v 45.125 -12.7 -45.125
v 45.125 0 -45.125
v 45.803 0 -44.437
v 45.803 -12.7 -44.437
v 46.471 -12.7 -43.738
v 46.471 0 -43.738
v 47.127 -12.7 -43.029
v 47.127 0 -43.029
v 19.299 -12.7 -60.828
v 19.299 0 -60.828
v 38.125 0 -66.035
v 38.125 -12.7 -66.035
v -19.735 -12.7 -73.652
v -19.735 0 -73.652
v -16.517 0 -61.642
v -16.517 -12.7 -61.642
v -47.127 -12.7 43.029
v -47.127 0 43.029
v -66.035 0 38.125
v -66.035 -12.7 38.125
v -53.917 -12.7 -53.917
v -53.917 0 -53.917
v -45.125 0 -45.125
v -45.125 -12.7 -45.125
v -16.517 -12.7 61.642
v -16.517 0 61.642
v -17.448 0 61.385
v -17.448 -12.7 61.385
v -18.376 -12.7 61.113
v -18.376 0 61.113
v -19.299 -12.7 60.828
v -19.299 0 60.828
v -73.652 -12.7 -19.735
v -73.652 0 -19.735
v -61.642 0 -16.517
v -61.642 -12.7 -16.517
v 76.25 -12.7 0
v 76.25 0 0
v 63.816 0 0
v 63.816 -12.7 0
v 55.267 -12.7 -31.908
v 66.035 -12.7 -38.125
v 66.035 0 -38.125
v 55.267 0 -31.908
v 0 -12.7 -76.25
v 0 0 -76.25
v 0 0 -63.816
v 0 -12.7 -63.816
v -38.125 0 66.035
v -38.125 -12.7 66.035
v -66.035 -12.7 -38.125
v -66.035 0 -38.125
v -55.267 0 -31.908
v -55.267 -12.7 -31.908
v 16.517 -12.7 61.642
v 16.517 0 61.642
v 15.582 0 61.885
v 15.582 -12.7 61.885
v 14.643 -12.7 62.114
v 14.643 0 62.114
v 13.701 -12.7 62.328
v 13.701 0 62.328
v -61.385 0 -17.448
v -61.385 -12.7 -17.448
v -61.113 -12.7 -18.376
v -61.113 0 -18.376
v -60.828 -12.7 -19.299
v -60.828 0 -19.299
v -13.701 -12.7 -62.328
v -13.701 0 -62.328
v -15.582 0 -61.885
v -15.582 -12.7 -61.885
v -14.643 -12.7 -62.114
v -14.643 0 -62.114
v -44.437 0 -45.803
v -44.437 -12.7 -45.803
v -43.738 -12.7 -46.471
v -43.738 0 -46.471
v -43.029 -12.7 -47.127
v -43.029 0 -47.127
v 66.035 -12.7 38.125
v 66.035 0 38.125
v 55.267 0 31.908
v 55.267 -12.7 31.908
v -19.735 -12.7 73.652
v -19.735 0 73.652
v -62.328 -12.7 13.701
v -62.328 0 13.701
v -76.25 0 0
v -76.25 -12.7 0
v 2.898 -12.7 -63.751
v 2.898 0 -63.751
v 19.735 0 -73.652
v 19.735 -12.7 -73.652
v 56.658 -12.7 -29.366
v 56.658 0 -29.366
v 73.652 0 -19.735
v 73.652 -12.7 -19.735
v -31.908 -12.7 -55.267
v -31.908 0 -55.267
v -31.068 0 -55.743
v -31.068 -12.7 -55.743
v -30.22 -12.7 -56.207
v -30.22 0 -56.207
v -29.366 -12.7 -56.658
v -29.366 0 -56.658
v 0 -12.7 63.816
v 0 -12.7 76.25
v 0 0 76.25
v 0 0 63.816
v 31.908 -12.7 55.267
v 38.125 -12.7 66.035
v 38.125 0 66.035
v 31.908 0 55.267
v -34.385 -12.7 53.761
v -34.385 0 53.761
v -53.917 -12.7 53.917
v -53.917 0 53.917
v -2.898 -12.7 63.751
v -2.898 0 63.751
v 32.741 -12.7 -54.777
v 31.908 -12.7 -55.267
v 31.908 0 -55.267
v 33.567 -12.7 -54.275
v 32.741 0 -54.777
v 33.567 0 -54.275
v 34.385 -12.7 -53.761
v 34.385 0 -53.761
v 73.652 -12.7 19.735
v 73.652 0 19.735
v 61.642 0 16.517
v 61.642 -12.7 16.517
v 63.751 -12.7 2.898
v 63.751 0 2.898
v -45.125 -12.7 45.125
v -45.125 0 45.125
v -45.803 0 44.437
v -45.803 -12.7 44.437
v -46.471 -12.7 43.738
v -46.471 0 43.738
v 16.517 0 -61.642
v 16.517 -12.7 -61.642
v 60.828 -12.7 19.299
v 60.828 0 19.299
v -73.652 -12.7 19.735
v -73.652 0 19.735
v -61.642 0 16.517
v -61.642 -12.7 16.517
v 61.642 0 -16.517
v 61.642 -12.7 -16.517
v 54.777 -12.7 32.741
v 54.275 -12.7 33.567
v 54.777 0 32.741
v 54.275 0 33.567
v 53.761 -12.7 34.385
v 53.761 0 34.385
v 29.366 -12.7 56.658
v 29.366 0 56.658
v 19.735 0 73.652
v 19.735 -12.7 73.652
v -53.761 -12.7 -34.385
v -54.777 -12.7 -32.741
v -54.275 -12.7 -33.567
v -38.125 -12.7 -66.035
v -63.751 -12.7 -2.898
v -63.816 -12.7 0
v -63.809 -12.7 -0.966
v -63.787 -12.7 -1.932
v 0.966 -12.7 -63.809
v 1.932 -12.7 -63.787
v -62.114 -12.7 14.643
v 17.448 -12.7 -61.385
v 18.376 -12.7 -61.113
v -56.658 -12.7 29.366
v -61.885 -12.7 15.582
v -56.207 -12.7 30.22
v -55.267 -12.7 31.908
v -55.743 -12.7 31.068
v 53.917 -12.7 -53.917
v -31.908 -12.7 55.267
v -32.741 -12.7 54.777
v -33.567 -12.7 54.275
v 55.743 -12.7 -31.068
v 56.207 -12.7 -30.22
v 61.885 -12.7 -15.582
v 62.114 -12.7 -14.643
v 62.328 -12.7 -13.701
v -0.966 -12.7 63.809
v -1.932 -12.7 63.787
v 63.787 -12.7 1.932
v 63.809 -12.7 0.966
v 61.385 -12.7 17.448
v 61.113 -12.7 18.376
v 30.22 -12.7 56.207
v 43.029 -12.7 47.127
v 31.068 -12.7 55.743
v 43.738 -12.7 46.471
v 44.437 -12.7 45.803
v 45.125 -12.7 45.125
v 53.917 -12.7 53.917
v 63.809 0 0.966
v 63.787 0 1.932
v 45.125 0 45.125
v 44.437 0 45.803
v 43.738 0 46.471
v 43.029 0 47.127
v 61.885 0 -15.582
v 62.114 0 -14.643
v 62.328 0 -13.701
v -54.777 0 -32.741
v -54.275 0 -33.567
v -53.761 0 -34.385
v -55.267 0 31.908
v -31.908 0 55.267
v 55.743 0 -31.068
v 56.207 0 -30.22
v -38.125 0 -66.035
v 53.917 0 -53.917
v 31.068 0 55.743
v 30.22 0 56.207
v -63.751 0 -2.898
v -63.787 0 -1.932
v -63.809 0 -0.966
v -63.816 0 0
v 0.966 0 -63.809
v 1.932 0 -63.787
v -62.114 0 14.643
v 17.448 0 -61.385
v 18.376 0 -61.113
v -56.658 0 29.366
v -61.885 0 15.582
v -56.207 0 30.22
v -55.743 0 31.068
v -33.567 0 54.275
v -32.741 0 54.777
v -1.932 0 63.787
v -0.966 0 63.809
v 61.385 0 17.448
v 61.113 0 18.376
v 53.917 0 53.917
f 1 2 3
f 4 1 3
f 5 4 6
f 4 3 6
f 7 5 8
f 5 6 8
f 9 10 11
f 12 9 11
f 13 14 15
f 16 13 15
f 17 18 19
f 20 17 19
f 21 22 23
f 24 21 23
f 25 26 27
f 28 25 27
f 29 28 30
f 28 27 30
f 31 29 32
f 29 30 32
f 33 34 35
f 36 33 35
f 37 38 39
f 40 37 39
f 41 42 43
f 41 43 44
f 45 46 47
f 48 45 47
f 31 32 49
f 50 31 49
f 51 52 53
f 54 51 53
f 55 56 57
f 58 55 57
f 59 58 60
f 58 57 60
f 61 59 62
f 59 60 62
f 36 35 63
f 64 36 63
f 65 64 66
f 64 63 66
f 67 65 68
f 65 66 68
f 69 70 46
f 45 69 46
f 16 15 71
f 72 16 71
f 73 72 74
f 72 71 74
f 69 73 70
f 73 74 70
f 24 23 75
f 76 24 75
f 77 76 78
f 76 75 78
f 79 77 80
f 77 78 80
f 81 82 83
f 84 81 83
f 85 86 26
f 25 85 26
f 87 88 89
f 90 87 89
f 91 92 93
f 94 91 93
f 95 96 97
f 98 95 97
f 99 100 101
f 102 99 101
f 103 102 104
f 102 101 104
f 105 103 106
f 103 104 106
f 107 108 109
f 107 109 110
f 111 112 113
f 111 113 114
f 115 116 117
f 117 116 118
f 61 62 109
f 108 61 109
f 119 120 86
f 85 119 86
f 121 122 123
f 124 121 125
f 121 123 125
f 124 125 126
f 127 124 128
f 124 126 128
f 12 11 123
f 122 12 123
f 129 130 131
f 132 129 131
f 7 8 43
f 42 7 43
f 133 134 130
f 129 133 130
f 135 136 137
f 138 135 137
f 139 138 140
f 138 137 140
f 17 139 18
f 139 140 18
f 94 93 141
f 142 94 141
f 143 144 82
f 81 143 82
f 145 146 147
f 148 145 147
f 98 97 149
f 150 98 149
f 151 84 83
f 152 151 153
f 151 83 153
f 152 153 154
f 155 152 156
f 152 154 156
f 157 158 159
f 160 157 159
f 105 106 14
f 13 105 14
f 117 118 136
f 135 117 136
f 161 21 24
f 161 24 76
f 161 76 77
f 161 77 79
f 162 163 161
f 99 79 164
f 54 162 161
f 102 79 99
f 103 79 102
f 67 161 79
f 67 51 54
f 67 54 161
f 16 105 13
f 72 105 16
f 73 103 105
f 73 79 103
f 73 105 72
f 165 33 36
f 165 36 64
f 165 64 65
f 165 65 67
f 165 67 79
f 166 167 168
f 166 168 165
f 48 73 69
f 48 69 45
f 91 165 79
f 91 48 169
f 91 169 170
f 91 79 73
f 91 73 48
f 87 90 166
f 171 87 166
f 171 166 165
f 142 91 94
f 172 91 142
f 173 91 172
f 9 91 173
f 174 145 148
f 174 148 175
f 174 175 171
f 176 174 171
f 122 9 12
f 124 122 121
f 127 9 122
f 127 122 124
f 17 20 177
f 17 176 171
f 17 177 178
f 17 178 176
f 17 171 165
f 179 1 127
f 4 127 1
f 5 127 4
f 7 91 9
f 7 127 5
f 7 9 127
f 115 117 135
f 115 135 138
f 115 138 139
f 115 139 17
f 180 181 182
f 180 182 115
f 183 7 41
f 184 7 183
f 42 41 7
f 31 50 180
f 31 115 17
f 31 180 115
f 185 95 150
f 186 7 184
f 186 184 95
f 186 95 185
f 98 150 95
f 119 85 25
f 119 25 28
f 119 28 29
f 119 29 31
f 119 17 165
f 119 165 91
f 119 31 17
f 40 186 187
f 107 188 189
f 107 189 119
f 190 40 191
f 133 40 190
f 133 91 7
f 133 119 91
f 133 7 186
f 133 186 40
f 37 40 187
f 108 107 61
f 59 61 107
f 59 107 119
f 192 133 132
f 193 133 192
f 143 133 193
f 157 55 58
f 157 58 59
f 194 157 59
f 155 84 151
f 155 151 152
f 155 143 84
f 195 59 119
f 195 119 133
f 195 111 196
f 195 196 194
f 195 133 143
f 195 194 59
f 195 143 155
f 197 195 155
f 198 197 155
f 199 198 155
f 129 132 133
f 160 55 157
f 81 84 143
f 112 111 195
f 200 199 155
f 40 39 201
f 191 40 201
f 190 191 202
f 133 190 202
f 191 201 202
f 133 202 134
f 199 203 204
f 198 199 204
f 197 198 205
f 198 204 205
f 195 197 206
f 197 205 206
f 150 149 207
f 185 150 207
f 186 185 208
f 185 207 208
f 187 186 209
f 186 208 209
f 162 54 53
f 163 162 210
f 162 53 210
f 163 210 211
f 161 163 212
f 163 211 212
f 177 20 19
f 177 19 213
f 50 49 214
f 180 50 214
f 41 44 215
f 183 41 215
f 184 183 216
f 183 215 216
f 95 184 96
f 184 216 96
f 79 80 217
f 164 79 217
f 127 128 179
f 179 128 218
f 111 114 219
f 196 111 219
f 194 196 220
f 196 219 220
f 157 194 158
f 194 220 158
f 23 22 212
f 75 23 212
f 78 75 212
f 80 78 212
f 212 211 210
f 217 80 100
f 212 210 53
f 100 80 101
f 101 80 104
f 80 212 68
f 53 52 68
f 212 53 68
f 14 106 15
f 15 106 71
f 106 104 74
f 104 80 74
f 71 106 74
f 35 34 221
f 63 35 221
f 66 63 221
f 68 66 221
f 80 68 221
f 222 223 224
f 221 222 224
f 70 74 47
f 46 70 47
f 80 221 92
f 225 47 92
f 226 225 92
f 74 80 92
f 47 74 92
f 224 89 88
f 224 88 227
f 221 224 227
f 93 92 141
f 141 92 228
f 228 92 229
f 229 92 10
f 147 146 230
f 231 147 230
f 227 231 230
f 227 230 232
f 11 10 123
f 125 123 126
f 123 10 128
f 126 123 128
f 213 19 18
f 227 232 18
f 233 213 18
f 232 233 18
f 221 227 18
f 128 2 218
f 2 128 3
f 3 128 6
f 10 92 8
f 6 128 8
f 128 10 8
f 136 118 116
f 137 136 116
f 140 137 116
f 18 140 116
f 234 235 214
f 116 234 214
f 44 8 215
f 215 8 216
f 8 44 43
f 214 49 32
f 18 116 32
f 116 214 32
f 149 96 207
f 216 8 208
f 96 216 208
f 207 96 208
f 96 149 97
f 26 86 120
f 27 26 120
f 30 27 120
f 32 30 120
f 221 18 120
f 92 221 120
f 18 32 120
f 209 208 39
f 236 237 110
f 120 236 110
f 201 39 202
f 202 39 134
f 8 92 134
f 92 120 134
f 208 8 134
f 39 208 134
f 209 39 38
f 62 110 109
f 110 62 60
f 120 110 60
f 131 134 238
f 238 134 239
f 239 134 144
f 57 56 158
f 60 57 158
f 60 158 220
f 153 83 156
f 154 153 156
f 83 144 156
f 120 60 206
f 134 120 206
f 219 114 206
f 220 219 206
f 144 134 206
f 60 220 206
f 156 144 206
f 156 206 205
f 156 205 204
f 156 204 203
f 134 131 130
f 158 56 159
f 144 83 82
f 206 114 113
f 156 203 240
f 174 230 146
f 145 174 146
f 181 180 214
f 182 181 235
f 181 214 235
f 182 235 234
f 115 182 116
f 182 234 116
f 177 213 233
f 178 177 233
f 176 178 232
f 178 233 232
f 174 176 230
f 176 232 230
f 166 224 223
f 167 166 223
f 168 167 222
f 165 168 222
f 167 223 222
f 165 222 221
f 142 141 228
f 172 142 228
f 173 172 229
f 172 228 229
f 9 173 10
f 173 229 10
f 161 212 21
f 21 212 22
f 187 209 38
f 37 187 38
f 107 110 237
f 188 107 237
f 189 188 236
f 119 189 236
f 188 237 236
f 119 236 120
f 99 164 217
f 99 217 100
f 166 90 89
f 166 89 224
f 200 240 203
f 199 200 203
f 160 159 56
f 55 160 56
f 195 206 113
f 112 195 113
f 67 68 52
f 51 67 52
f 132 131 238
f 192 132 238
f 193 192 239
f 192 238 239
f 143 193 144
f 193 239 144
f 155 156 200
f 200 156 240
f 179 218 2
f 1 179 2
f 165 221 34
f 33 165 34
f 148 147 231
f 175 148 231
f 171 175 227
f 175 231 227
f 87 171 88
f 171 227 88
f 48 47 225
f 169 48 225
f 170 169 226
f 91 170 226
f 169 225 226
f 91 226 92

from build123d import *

# Parameters (mm, degrees)
F1_DEPTH = 12.7


with BuildPart() as f1:
    # F0 (on Front) → F1 (new body)
    with BuildSketch(Plane.XZ):
        with BuildLine():
            ThreePointArc((13.700902, 62.328232), (6.890739, 63.44321), (0, 63.816324))
            ThreePointArc((0, 63.816324), (-1.449213, 63.799867), (-2.897679, 63.750503))
            ThreePointArc((-2.897679, 63.750503), (-9.764368, 63.06489), (-16.51688, 61.641836))
            ThreePointArc((-16.51688, 61.641836), (-17.912453, 61.250855), (-19.298787, 60.828283))
            ThreePointArc((-19.298787, 60.828283), (-25.75405, 58.388801), (-31.908162, 55.266558))
            ThreePointArc((-31.908162, 55.266558), (-33.154989, 54.527699), (-34.384715, 53.760716))
            ThreePointArc((-34.384715, 53.760716), (-39.988636, 49.733612), (-45.124956, 45.124956))
            ThreePointArc((-45.124956, 45.124956), (-46.138067, 44.08857), (-47.127381, 43.029445))
            ThreePointArc((-47.127381, 43.029445), (-51.498062, 37.68916), (-55.266558, 31.908162))
            ThreePointArc((-55.266558, 31.908162), (-55.976912, 30.644878), (-56.658395, 29.365788))
            ThreePointArc((-56.658395, 29.365788), (-59.497981, 23.076254), (-61.641836, 16.51688))
            ThreePointArc((-61.641836, 16.51688), (-62.001023, 15.112788), (-62.328232, 13.700902))
            ThreePointArc((-62.328232, 13.700902), (-63.44321, 6.890739), (-63.816324, 0))
            ThreePointArc((-63.816324, 0), (-63.799867, -1.449213), (-63.750503, -2.897679))
            ThreePointArc((-63.750503, -2.897679), (-63.06489, -9.764368), (-61.641836, -16.51688))
            ThreePointArc((-61.641836, -16.51688), (-61.250855, -17.912453), (-60.828283, -19.298787))
            ThreePointArc((-60.828283, -19.298787), (-58.388801, -25.75405), (-55.266558, -31.908162))
            ThreePointArc((-55.266558, -31.908162), (-54.527699, -33.154989), (-53.760716, -34.384715))
            ThreePointArc((-53.760716, -34.384715), (-49.733612, -39.988636), (-45.124956, -45.124956))
            ThreePointArc((-45.124956, -45.124956), (-44.08857, -46.138067), (-43.029445, -47.127381))
            ThreePointArc((-43.029445, -47.127381), (-37.68916, -51.498062), (-31.908162, -55.266558))
            ThreePointArc((-31.908162, -55.266558), (-30.644878, -55.976912), (-29.365788, -56.658395))
            ThreePointArc((-29.365788, -56.658395), (-23.076254, -59.497981), (-16.51688, -61.641836))
            ThreePointArc((-16.51688, -61.641836), (-15.112788, -62.001023), (-13.700902, -62.328232))
            ThreePointArc((-13.700902, -62.328232), (-6.890739, -63.44321), (0, -63.816324))
            ThreePointArc((0, -63.816324), (1.449213, -63.799867), (2.897679, -63.750503))
            ThreePointArc((2.897679, -63.750503), (9.764368, -63.06489), (16.51688, -61.641836))
            ThreePointArc((16.51688, -61.641836), (17.912453, -61.250855), (19.298787, -60.828283))
            ThreePointArc((19.298787, -60.828283), (25.75405, -58.388801), (31.908162, -55.266558))
            ThreePointArc((31.908162, -55.266558), (33.154989, -54.527699), (34.384715, -53.760716))
            ThreePointArc((34.384715, -53.760716), (39.988636, -49.733612), (45.124956, -45.124956))
            ThreePointArc((45.124956, -45.124956), (46.138067, -44.08857), (47.127381, -43.029445))
            ThreePointArc((47.127381, -43.029445), (51.498062, -37.68916), (55.266558, -31.908162))
            ThreePointArc((55.266558, -31.908162), (55.976912, -30.644878), (56.658395, -29.365788))
            ThreePointArc((56.658395, -29.365788), (59.497981, -23.076254), (61.641836, -16.51688))
            ThreePointArc((61.641836, -16.51688), (62.001023, -15.112788), (62.328232, -13.700902))
            ThreePointArc((62.328232, -13.700902), (63.44321, -6.890739), (63.816324, 0))
            ThreePointArc((63.816324, 0), (63.799867, 1.449213), (63.750503, 2.897679))
            ThreePointArc((63.750503, 2.897679), (63.06489, 9.764368), (61.641836, 16.51688))
            ThreePointArc((61.641836, 16.51688), (61.250855, 17.912453), (60.828283, 19.298787))
            ThreePointArc((60.828283, 19.298787), (58.388801, 25.75405), (55.266558, 31.908162))
            ThreePointArc((55.266558, 31.908162), (54.527699, 33.154989), (53.760716, 34.384715))
            ThreePointArc((53.760716, 34.384715), (49.733612, 39.988636), (45.124956, 45.124956))
            ThreePointArc((45.124956, 45.124956), (44.08857, 46.138067), (43.029445, 47.127381))
            ThreePointArc((43.029445, 47.127381), (37.68916, 51.498062), (31.908162, 55.266558))
            ThreePointArc((31.908162, 55.266558), (30.644878, 55.976912), (29.365788, 56.658395))
            ThreePointArc((29.365788, 56.658395), (23.076254, 59.497981), (16.51688, 61.641836))
            ThreePointArc((16.51688, 61.641836), (15.112788, 62.001023), (13.700902, 62.328232))
        make_face()
        with BuildLine():
            ThreePointArc((-45.124956, 45.124956), (-39.988636, 49.733612), (-34.384715, 53.760716))
            Line((-34.384715, 53.760716), (-53.916988, 53.916988))
            Line((-53.916988, 53.916988), (-45.124956, 45.124956))
        make_face()
        with BuildLine():
            ThreePointArc((-31.908162, 55.266558), (-25.75405, 58.388801), (-19.298787, 60.828283))
            Line((-19.298787, 60.828283), (-38.125068, 66.034555))
            Line((-38.125068, 66.034555), (-31.908162, 55.266558))
        make_face()
        with BuildLine():
            ThreePointArc((-16.51688, 61.641836), (-9.764368, 63.06489), (-2.897679, 63.750503))
            Line((-2.897679, 63.750503), (-19.734987, 73.651976))
            Line((-19.734987, 73.651976), (-16.51688, 61.641836))
        make_face()
        with BuildLine():
            Line((0, 76.250136), (0, 63.816324))
            ThreePointArc((0, 63.816324), (6.890739, 63.44321), (13.700902, 62.328232))
            Line((13.700902, 62.328232), (0, 76.250136))
        make_face()
        with BuildLine():
            Line((19.734987, 73.651976), (16.51688, 61.641836))
            ThreePointArc((16.51688, 61.641836), (23.076254, 59.497981), (29.365788, 56.658395))
            Line((29.365788, 56.658395), (19.734987, 73.651976))
        make_face()
        with BuildLine():
            Line((38.125068, 66.034555), (31.908162, 55.266558))
            ThreePointArc((31.908162, 55.266558), (37.68916, 51.498062), (43.029445, 47.127381))
            Line((43.029445, 47.127381), (38.125068, 66.034555))
        make_face()
        with BuildLine():
            Line((53.916988, 53.916988), (45.124956, 45.124956))
            ThreePointArc((45.124956, 45.124956), (49.733612, 39.988636), (53.760716, 34.384715))
            Line((53.760716, 34.384715), (53.916988, 53.916988))
        make_face()
        with BuildLine():
            Line((66.034555, 38.125068), (55.266558, 31.908162))
            ThreePointArc((55.266558, 31.908162), (58.388801, 25.75405), (60.828283, 19.298787))
            Line((60.828283, 19.298787), (66.034555, 38.125068))
        make_face()
        with BuildLine():
            Line((73.651976, 19.734987), (61.641836, 16.51688))
            ThreePointArc((61.641836, 16.51688), (63.06489, 9.764368), (63.750503, 2.897679))
            Line((63.750503, 2.897679), (73.651976, 19.734987))
        make_face()
        with BuildLine():
            Line((76.250136, 0), (63.816324, 0))
            ThreePointArc((63.816324, 0), (63.44321, -6.890739), (62.328232, -13.700902))
            Line((62.328232, -13.700902), (76.250136, 0))
        make_face()
        with BuildLine():
            Line((73.651976, -19.734987), (61.641836, -16.51688))
            ThreePointArc((61.641836, -16.51688), (59.497981, -23.076254), (56.658395, -29.365788))
            Line((56.658395, -29.365788), (73.651976, -19.734987))
        make_face()
        with BuildLine():
            Line((66.034555, -38.125068), (55.266558, -31.908162))
            ThreePointArc((55.266558, -31.908162), (51.498062, -37.68916), (47.127381, -43.029445))
            Line((47.127381, -43.029445), (66.034555, -38.125068))
        make_face()
        with BuildLine():
            Line((53.916988, -53.916988), (45.124956, -45.124956))
            ThreePointArc((45.124956, -45.124956), (39.988636, -49.733612), (34.384715, -53.760716))
            Line((34.384715, -53.760716), (53.916988, -53.916988))
        make_face()
        with BuildLine():
            Line((38.125068, -66.034555), (31.908162, -55.266558))
            ThreePointArc((31.908162, -55.266558), (25.75405, -58.388801), (19.298787, -60.828283))
            Line((19.298787, -60.828283), (38.125068, -66.034555))
        make_face()
        with BuildLine():
            Line((19.734987, -73.651976), (16.51688, -61.641836))
            ThreePointArc((16.51688, -61.641836), (9.764368, -63.06489), (2.897679, -63.750503))
            Line((2.897679, -63.750503), (19.734987, -73.651976))
        make_face()
        with BuildLine():
            ThreePointArc((0, -63.816324), (-6.890739, -63.44321), (-13.700902, -62.328232))
            Line((-13.700902, -62.328232), (0, -76.250136))
            Line((0, -76.250136), (0, -63.816324))
        make_face()
        with BuildLine():
            ThreePointArc((-16.51688, -61.641836), (-23.076254, -59.497981), (-29.365788, -56.658395))
            Line((-29.365788, -56.658395), (-19.734987, -73.651976))
            Line((-19.734987, -73.651976), (-16.51688, -61.641836))
        make_face()
        with BuildLine():
            ThreePointArc((-31.908162, -55.266558), (-37.68916, -51.498062), (-43.029445, -47.127381))
            Line((-43.029445, -47.127381), (-38.125068, -66.034555))
            Line((-38.125068, -66.034555), (-31.908162, -55.266558))
        make_face()
        with BuildLine():
            ThreePointArc((-55.266558, -31.908162), (-58.388801, -25.75405), (-60.828283, -19.298787))
            Line((-60.828283, -19.298787), (-66.034555, -38.125068))
            Line((-66.034555, -38.125068), (-55.266558, -31.908162))
        make_face()
        with BuildLine():
            ThreePointArc((-61.641836, -16.51688), (-63.06489, -9.764368), (-63.750503, -2.897679))
            Line((-63.750503, -2.897679), (-73.651976, -19.734987))
            Line((-73.651976, -19.734987), (-61.641836, -16.51688))
        make_face()
        with BuildLine():
            ThreePointArc((-63.816324, 0), (-63.44321, 6.890739), (-62.328232, 13.700902))
            Line((-62.328232, 13.700902), (-76.250136, 0))
            Line((-76.250136, 0), (-63.816324, 0))
        make_face()
        with BuildLine():
            ThreePointArc((-61.641836, 16.51688), (-59.497981, 23.076254), (-56.658395, 29.365788))
            Line((-56.658395, 29.365788), (-73.651976, 19.734987))
            Line((-73.651976, 19.734987), (-61.641836, 16.51688))
        make_face()
        with BuildLine():
            ThreePointArc((-55.266558, 31.908162), (-51.498062, 37.68916), (-47.127381, 43.029445))
            Line((-47.127381, 43.029445), (-66.034555, 38.125068))
            Line((-66.034555, 38.125068), (-55.266558, 31.908162))
        make_face()
        with BuildLine():
            ThreePointArc((-45.124956, -45.124956), (-49.733612, -39.988636), (-53.760716, -34.384715))
            Line((-53.760716, -34.384715), (-53.916988, -53.916988))
            Line((-53.916988, -53.916988), (-45.124956, -45.124956))
        make_face()
    extrude(amount=F1_DEPTH)


solid = f1.part
